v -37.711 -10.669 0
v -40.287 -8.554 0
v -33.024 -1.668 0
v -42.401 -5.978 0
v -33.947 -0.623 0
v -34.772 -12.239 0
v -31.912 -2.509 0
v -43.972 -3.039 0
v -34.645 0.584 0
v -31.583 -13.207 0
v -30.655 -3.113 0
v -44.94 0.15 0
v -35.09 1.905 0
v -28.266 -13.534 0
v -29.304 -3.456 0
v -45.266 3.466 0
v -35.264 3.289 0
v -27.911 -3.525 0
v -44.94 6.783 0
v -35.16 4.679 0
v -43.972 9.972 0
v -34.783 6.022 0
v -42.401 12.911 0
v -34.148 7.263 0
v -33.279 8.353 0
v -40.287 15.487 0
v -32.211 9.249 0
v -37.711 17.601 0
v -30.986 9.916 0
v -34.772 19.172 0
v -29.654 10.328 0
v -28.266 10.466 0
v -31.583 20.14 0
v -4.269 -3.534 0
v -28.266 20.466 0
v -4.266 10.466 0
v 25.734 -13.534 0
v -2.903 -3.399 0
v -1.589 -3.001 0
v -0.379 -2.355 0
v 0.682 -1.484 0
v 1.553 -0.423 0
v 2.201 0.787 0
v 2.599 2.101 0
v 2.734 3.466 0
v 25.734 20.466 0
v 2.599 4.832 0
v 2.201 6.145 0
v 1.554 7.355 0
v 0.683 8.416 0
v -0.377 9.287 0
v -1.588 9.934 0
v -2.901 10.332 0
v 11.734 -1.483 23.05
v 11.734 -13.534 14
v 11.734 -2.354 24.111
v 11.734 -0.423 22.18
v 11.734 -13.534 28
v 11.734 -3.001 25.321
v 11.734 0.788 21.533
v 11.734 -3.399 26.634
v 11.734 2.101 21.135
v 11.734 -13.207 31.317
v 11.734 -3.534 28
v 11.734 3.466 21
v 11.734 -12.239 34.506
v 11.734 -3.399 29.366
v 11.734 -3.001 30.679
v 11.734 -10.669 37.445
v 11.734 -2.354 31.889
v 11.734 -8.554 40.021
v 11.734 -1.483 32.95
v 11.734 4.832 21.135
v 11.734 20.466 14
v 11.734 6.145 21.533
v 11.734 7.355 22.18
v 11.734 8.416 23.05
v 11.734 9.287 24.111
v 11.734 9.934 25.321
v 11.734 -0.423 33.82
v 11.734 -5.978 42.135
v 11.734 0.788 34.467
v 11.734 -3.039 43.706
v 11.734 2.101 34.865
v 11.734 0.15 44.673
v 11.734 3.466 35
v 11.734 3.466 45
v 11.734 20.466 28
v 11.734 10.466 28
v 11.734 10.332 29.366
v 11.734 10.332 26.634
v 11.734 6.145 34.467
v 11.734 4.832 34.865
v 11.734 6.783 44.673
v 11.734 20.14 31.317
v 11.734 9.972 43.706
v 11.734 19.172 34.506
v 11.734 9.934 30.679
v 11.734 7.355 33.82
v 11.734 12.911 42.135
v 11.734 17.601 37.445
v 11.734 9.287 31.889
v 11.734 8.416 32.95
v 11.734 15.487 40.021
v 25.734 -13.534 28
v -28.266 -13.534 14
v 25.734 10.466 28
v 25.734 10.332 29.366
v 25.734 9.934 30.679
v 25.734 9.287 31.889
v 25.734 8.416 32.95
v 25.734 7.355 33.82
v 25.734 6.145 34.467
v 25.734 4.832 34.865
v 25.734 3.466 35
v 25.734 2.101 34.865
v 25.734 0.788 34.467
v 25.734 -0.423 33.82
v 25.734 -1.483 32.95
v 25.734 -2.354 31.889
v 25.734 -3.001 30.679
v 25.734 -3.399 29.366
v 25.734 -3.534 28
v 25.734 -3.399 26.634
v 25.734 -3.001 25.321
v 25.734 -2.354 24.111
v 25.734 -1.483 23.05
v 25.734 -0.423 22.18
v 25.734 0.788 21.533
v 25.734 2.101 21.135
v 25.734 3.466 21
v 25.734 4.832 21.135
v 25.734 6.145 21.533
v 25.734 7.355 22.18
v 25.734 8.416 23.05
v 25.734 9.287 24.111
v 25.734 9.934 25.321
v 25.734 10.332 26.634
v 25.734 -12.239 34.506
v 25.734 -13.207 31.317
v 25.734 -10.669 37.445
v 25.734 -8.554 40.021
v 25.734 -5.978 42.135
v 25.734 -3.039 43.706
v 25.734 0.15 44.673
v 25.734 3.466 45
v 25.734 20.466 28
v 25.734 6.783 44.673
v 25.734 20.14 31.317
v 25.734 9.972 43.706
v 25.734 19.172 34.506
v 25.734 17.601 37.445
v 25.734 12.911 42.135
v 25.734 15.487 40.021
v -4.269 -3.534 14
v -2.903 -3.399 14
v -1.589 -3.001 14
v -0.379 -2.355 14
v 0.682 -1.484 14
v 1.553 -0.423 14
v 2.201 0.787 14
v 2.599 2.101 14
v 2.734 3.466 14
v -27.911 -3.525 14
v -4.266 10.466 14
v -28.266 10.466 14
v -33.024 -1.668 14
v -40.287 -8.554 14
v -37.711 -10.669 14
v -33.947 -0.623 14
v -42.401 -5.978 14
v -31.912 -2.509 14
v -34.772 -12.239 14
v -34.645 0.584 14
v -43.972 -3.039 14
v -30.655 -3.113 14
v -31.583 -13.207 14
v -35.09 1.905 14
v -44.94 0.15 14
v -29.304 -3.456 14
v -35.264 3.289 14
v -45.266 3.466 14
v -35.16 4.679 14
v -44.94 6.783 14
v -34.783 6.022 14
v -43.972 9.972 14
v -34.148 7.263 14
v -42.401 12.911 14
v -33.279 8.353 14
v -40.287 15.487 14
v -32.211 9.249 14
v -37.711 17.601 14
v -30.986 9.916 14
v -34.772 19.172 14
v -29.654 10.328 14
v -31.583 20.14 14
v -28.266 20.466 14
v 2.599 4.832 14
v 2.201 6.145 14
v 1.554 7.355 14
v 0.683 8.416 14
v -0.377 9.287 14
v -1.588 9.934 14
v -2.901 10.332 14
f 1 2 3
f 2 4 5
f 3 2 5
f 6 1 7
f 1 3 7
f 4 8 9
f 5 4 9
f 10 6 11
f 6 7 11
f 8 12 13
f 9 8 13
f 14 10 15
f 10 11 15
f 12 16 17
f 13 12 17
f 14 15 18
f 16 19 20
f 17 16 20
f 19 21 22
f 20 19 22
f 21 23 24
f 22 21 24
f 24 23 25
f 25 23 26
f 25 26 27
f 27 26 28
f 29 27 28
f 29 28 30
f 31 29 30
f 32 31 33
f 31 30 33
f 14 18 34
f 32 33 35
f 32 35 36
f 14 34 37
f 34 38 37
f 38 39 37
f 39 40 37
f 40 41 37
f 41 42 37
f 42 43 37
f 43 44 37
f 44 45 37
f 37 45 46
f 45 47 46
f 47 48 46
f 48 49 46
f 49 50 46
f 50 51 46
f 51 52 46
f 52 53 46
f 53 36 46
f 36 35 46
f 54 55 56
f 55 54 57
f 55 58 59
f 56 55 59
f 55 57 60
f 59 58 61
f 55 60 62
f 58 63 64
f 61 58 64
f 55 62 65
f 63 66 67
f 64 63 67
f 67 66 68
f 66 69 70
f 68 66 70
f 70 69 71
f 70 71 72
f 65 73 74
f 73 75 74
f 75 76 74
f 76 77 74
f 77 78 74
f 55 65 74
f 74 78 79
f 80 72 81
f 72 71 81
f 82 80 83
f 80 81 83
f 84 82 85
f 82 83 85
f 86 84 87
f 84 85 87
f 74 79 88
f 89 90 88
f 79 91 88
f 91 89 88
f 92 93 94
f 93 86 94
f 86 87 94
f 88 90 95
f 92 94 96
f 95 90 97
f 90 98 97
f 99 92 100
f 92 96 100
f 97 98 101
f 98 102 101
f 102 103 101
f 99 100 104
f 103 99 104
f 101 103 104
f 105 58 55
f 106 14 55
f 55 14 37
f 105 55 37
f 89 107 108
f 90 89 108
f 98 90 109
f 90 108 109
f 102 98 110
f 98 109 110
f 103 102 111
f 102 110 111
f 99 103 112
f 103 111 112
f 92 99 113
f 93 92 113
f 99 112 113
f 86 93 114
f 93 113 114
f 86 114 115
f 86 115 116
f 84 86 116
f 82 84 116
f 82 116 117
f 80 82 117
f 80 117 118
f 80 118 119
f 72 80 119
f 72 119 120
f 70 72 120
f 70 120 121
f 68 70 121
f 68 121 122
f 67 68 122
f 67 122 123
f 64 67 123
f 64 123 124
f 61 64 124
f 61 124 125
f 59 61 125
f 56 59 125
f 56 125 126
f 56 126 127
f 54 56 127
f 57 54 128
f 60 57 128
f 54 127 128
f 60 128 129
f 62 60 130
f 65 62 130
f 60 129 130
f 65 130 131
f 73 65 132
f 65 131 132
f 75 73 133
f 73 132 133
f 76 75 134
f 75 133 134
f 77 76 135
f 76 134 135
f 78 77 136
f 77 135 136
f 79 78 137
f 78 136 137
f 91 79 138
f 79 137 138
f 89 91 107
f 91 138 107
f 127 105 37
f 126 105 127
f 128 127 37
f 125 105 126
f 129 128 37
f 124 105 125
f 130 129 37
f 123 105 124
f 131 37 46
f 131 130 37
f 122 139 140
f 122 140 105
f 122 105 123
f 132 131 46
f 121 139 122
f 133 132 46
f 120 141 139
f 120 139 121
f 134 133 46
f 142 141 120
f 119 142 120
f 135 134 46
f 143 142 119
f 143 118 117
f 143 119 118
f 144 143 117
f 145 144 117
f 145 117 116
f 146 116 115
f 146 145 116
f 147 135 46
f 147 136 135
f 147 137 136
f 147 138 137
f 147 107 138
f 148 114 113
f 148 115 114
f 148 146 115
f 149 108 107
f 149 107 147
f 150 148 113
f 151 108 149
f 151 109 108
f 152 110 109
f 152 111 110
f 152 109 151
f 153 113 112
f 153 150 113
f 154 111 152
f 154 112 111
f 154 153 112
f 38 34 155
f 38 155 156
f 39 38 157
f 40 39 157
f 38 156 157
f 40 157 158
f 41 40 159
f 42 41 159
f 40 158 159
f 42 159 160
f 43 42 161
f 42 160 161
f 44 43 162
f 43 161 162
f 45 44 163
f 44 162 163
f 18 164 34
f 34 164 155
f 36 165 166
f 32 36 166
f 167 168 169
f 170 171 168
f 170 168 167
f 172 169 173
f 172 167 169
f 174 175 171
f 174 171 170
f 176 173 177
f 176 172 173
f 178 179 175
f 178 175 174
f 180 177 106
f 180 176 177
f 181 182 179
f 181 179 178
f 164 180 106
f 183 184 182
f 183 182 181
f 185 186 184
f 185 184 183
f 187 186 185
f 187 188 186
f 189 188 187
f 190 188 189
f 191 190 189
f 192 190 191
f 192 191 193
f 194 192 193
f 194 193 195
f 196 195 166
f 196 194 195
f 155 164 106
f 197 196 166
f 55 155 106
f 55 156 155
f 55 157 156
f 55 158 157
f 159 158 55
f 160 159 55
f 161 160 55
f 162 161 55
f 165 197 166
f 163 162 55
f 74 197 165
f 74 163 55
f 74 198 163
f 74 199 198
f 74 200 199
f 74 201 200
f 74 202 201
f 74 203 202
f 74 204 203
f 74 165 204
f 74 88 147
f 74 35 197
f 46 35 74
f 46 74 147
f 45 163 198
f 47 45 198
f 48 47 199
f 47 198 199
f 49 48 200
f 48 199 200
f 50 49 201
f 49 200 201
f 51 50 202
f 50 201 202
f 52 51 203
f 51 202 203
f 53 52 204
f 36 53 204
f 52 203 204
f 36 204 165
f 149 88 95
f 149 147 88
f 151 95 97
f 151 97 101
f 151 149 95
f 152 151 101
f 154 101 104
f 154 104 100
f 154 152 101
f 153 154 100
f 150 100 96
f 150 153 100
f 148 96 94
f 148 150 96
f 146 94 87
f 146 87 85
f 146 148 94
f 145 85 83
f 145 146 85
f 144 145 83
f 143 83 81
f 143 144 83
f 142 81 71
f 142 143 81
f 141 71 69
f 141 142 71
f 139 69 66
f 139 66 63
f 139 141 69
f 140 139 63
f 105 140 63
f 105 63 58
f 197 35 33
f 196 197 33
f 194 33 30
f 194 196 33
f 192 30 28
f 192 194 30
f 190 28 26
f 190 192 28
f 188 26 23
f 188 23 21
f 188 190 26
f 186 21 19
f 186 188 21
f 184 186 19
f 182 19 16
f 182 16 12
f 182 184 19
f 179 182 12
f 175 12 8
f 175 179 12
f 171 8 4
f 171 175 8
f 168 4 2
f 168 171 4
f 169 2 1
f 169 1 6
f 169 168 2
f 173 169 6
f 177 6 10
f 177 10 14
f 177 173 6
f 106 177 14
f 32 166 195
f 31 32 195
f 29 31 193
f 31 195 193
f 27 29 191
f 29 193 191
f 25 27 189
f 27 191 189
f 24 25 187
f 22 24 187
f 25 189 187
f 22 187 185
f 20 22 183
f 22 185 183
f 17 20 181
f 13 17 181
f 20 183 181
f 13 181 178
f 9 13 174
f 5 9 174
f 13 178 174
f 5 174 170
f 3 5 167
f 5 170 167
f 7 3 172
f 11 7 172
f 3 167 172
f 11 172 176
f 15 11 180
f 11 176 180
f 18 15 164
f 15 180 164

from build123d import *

# Parameters (mm, degrees)
F0_W      = 54
F0_H      = 34
F1_DEPTH  = 14
F2_W      = 14
F2_H      = 34
F3_DEPTH  = 14
F5_DEPTH  = 14
F7_DEPTH  = 14
F8_R      = 7
F9_DEPTH  = 25
F11_DEPTH = 25


with BuildPart() as f1:
    # F0 (on Top) → F1 (new body)
    with BuildSketch(Plane.XY):
        with Locations((-1.2663472444, 3.4664713239)):
            Rectangle(F0_W, F0_H)
    extrude(amount=F1_DEPTH)

    # F2 (on face) → F3 (join)
    with BuildSketch(Plane.XY.offset(14)):
        with Locations((18.7336527556, 3.4664713239)):
            Rectangle(F2_W, F2_H)
    extrude(amount=F3_DEPTH)

    # F4 (on face) → F5 (join)
    with BuildSketch(Plane.YZ.offset(25.7336527556)):
        with BuildLine():
            Line((-13.5335286761, 28), (20.4664713239, 28))
            ThreePointArc((20.4664713239, 28), (3.4664713239, 45), (-13.5335286761, 28))
        make_face()
        with BuildLine():
            ThreePointArc((-13.5335286761, 28), (3.4664713239, 11), (20.4664713239, 28))
            Line((20.4664713239, 28), (-13.5335286761, 28))
        make_face()
    extrude(amount=-F5_DEPTH)

    # F6 (on face) → F7 (join)
    with BuildSketch(Plane.XY.offset(14)):
        with BuildLine():
            Line((-28.2663472444, -13.5335286761), (-28.2663472444, 20.4664713239))
            ThreePointArc((-28.2663472444, 20.4664713239), (-45.2663472444, 3.4664713239), (-28.2663472444, -13.5335286761))
        make_face()
    extrude(amount=-F7_DEPTH)

    # F8 (on face) → F9 (cut)
    with BuildSketch(Plane.YZ.offset(25.7336527556)):
        with Locations((3.4664713239, 28)):
            Circle(F8_R)
    extrude(amount=-F9_DEPTH, mode=Mode.SUBTRACT)

    # F10 (on face) → F11 (cut)
    with BuildSketch(Plane.XY.offset(14)):
        with BuildLine():
            ThreePointArc((-27.9110185812, -3.5245043978), (-23.1925271529, -1.3560124427), (-21.2663472444, 3.4664713239))
            ThreePointArc((-21.2663472444, 3.4664713239), (-23.3165997761, 8.4162187922), (-28.2663472444, 10.4664713239))
            ThreePointArc((-28.2663472444, 10.4664713239), (-35.2640908111, 3.2887497041), (-27.9110185812, -3.5245043978))
        make_face()
        with BuildLine():
            ThreePointArc((-28.2663472444, 10.4664713239), (-23.3165997761, 8.4162187922), (-21.2663472444, 3.4664713239))
            ThreePointArc((-21.2663472444, 3.4664713239), (-23.1925271529, -1.3560124427), (-27.9110185812, -3.5245043978))
            Line((-27.9110185812, -3.5245043978), (-4.2690190308, -3.5335281663))
            ThreePointArc((-4.2690190308, -3.5335281663), (-11.2663471169, 3.4678072171), (-4.2663472444, 10.4664713239))
            Line((-4.2663472444, 10.4664713239), (-28.2663472444, 10.4664713239))
        make_face()
        with BuildLine():
            ThreePointArc((2.7336527556, 3.4664713239), (0.6834002239, 8.4162187922), (-4.2663472444, 10.4664713239))
            ThreePointArc((-4.2663472444, 10.4664713239), (-11.2663471169, 3.4678072171), (-4.2690190308, -3.5335281663))
            ThreePointArc((-4.2690190308, -3.5335281663), (0.6824555146, -1.4842206735), (2.7336527556, 3.4664713239))
        make_face()
    extrude(amount=-F11_DEPTH, mode=Mode.SUBTRACT)


solid = f1.part
